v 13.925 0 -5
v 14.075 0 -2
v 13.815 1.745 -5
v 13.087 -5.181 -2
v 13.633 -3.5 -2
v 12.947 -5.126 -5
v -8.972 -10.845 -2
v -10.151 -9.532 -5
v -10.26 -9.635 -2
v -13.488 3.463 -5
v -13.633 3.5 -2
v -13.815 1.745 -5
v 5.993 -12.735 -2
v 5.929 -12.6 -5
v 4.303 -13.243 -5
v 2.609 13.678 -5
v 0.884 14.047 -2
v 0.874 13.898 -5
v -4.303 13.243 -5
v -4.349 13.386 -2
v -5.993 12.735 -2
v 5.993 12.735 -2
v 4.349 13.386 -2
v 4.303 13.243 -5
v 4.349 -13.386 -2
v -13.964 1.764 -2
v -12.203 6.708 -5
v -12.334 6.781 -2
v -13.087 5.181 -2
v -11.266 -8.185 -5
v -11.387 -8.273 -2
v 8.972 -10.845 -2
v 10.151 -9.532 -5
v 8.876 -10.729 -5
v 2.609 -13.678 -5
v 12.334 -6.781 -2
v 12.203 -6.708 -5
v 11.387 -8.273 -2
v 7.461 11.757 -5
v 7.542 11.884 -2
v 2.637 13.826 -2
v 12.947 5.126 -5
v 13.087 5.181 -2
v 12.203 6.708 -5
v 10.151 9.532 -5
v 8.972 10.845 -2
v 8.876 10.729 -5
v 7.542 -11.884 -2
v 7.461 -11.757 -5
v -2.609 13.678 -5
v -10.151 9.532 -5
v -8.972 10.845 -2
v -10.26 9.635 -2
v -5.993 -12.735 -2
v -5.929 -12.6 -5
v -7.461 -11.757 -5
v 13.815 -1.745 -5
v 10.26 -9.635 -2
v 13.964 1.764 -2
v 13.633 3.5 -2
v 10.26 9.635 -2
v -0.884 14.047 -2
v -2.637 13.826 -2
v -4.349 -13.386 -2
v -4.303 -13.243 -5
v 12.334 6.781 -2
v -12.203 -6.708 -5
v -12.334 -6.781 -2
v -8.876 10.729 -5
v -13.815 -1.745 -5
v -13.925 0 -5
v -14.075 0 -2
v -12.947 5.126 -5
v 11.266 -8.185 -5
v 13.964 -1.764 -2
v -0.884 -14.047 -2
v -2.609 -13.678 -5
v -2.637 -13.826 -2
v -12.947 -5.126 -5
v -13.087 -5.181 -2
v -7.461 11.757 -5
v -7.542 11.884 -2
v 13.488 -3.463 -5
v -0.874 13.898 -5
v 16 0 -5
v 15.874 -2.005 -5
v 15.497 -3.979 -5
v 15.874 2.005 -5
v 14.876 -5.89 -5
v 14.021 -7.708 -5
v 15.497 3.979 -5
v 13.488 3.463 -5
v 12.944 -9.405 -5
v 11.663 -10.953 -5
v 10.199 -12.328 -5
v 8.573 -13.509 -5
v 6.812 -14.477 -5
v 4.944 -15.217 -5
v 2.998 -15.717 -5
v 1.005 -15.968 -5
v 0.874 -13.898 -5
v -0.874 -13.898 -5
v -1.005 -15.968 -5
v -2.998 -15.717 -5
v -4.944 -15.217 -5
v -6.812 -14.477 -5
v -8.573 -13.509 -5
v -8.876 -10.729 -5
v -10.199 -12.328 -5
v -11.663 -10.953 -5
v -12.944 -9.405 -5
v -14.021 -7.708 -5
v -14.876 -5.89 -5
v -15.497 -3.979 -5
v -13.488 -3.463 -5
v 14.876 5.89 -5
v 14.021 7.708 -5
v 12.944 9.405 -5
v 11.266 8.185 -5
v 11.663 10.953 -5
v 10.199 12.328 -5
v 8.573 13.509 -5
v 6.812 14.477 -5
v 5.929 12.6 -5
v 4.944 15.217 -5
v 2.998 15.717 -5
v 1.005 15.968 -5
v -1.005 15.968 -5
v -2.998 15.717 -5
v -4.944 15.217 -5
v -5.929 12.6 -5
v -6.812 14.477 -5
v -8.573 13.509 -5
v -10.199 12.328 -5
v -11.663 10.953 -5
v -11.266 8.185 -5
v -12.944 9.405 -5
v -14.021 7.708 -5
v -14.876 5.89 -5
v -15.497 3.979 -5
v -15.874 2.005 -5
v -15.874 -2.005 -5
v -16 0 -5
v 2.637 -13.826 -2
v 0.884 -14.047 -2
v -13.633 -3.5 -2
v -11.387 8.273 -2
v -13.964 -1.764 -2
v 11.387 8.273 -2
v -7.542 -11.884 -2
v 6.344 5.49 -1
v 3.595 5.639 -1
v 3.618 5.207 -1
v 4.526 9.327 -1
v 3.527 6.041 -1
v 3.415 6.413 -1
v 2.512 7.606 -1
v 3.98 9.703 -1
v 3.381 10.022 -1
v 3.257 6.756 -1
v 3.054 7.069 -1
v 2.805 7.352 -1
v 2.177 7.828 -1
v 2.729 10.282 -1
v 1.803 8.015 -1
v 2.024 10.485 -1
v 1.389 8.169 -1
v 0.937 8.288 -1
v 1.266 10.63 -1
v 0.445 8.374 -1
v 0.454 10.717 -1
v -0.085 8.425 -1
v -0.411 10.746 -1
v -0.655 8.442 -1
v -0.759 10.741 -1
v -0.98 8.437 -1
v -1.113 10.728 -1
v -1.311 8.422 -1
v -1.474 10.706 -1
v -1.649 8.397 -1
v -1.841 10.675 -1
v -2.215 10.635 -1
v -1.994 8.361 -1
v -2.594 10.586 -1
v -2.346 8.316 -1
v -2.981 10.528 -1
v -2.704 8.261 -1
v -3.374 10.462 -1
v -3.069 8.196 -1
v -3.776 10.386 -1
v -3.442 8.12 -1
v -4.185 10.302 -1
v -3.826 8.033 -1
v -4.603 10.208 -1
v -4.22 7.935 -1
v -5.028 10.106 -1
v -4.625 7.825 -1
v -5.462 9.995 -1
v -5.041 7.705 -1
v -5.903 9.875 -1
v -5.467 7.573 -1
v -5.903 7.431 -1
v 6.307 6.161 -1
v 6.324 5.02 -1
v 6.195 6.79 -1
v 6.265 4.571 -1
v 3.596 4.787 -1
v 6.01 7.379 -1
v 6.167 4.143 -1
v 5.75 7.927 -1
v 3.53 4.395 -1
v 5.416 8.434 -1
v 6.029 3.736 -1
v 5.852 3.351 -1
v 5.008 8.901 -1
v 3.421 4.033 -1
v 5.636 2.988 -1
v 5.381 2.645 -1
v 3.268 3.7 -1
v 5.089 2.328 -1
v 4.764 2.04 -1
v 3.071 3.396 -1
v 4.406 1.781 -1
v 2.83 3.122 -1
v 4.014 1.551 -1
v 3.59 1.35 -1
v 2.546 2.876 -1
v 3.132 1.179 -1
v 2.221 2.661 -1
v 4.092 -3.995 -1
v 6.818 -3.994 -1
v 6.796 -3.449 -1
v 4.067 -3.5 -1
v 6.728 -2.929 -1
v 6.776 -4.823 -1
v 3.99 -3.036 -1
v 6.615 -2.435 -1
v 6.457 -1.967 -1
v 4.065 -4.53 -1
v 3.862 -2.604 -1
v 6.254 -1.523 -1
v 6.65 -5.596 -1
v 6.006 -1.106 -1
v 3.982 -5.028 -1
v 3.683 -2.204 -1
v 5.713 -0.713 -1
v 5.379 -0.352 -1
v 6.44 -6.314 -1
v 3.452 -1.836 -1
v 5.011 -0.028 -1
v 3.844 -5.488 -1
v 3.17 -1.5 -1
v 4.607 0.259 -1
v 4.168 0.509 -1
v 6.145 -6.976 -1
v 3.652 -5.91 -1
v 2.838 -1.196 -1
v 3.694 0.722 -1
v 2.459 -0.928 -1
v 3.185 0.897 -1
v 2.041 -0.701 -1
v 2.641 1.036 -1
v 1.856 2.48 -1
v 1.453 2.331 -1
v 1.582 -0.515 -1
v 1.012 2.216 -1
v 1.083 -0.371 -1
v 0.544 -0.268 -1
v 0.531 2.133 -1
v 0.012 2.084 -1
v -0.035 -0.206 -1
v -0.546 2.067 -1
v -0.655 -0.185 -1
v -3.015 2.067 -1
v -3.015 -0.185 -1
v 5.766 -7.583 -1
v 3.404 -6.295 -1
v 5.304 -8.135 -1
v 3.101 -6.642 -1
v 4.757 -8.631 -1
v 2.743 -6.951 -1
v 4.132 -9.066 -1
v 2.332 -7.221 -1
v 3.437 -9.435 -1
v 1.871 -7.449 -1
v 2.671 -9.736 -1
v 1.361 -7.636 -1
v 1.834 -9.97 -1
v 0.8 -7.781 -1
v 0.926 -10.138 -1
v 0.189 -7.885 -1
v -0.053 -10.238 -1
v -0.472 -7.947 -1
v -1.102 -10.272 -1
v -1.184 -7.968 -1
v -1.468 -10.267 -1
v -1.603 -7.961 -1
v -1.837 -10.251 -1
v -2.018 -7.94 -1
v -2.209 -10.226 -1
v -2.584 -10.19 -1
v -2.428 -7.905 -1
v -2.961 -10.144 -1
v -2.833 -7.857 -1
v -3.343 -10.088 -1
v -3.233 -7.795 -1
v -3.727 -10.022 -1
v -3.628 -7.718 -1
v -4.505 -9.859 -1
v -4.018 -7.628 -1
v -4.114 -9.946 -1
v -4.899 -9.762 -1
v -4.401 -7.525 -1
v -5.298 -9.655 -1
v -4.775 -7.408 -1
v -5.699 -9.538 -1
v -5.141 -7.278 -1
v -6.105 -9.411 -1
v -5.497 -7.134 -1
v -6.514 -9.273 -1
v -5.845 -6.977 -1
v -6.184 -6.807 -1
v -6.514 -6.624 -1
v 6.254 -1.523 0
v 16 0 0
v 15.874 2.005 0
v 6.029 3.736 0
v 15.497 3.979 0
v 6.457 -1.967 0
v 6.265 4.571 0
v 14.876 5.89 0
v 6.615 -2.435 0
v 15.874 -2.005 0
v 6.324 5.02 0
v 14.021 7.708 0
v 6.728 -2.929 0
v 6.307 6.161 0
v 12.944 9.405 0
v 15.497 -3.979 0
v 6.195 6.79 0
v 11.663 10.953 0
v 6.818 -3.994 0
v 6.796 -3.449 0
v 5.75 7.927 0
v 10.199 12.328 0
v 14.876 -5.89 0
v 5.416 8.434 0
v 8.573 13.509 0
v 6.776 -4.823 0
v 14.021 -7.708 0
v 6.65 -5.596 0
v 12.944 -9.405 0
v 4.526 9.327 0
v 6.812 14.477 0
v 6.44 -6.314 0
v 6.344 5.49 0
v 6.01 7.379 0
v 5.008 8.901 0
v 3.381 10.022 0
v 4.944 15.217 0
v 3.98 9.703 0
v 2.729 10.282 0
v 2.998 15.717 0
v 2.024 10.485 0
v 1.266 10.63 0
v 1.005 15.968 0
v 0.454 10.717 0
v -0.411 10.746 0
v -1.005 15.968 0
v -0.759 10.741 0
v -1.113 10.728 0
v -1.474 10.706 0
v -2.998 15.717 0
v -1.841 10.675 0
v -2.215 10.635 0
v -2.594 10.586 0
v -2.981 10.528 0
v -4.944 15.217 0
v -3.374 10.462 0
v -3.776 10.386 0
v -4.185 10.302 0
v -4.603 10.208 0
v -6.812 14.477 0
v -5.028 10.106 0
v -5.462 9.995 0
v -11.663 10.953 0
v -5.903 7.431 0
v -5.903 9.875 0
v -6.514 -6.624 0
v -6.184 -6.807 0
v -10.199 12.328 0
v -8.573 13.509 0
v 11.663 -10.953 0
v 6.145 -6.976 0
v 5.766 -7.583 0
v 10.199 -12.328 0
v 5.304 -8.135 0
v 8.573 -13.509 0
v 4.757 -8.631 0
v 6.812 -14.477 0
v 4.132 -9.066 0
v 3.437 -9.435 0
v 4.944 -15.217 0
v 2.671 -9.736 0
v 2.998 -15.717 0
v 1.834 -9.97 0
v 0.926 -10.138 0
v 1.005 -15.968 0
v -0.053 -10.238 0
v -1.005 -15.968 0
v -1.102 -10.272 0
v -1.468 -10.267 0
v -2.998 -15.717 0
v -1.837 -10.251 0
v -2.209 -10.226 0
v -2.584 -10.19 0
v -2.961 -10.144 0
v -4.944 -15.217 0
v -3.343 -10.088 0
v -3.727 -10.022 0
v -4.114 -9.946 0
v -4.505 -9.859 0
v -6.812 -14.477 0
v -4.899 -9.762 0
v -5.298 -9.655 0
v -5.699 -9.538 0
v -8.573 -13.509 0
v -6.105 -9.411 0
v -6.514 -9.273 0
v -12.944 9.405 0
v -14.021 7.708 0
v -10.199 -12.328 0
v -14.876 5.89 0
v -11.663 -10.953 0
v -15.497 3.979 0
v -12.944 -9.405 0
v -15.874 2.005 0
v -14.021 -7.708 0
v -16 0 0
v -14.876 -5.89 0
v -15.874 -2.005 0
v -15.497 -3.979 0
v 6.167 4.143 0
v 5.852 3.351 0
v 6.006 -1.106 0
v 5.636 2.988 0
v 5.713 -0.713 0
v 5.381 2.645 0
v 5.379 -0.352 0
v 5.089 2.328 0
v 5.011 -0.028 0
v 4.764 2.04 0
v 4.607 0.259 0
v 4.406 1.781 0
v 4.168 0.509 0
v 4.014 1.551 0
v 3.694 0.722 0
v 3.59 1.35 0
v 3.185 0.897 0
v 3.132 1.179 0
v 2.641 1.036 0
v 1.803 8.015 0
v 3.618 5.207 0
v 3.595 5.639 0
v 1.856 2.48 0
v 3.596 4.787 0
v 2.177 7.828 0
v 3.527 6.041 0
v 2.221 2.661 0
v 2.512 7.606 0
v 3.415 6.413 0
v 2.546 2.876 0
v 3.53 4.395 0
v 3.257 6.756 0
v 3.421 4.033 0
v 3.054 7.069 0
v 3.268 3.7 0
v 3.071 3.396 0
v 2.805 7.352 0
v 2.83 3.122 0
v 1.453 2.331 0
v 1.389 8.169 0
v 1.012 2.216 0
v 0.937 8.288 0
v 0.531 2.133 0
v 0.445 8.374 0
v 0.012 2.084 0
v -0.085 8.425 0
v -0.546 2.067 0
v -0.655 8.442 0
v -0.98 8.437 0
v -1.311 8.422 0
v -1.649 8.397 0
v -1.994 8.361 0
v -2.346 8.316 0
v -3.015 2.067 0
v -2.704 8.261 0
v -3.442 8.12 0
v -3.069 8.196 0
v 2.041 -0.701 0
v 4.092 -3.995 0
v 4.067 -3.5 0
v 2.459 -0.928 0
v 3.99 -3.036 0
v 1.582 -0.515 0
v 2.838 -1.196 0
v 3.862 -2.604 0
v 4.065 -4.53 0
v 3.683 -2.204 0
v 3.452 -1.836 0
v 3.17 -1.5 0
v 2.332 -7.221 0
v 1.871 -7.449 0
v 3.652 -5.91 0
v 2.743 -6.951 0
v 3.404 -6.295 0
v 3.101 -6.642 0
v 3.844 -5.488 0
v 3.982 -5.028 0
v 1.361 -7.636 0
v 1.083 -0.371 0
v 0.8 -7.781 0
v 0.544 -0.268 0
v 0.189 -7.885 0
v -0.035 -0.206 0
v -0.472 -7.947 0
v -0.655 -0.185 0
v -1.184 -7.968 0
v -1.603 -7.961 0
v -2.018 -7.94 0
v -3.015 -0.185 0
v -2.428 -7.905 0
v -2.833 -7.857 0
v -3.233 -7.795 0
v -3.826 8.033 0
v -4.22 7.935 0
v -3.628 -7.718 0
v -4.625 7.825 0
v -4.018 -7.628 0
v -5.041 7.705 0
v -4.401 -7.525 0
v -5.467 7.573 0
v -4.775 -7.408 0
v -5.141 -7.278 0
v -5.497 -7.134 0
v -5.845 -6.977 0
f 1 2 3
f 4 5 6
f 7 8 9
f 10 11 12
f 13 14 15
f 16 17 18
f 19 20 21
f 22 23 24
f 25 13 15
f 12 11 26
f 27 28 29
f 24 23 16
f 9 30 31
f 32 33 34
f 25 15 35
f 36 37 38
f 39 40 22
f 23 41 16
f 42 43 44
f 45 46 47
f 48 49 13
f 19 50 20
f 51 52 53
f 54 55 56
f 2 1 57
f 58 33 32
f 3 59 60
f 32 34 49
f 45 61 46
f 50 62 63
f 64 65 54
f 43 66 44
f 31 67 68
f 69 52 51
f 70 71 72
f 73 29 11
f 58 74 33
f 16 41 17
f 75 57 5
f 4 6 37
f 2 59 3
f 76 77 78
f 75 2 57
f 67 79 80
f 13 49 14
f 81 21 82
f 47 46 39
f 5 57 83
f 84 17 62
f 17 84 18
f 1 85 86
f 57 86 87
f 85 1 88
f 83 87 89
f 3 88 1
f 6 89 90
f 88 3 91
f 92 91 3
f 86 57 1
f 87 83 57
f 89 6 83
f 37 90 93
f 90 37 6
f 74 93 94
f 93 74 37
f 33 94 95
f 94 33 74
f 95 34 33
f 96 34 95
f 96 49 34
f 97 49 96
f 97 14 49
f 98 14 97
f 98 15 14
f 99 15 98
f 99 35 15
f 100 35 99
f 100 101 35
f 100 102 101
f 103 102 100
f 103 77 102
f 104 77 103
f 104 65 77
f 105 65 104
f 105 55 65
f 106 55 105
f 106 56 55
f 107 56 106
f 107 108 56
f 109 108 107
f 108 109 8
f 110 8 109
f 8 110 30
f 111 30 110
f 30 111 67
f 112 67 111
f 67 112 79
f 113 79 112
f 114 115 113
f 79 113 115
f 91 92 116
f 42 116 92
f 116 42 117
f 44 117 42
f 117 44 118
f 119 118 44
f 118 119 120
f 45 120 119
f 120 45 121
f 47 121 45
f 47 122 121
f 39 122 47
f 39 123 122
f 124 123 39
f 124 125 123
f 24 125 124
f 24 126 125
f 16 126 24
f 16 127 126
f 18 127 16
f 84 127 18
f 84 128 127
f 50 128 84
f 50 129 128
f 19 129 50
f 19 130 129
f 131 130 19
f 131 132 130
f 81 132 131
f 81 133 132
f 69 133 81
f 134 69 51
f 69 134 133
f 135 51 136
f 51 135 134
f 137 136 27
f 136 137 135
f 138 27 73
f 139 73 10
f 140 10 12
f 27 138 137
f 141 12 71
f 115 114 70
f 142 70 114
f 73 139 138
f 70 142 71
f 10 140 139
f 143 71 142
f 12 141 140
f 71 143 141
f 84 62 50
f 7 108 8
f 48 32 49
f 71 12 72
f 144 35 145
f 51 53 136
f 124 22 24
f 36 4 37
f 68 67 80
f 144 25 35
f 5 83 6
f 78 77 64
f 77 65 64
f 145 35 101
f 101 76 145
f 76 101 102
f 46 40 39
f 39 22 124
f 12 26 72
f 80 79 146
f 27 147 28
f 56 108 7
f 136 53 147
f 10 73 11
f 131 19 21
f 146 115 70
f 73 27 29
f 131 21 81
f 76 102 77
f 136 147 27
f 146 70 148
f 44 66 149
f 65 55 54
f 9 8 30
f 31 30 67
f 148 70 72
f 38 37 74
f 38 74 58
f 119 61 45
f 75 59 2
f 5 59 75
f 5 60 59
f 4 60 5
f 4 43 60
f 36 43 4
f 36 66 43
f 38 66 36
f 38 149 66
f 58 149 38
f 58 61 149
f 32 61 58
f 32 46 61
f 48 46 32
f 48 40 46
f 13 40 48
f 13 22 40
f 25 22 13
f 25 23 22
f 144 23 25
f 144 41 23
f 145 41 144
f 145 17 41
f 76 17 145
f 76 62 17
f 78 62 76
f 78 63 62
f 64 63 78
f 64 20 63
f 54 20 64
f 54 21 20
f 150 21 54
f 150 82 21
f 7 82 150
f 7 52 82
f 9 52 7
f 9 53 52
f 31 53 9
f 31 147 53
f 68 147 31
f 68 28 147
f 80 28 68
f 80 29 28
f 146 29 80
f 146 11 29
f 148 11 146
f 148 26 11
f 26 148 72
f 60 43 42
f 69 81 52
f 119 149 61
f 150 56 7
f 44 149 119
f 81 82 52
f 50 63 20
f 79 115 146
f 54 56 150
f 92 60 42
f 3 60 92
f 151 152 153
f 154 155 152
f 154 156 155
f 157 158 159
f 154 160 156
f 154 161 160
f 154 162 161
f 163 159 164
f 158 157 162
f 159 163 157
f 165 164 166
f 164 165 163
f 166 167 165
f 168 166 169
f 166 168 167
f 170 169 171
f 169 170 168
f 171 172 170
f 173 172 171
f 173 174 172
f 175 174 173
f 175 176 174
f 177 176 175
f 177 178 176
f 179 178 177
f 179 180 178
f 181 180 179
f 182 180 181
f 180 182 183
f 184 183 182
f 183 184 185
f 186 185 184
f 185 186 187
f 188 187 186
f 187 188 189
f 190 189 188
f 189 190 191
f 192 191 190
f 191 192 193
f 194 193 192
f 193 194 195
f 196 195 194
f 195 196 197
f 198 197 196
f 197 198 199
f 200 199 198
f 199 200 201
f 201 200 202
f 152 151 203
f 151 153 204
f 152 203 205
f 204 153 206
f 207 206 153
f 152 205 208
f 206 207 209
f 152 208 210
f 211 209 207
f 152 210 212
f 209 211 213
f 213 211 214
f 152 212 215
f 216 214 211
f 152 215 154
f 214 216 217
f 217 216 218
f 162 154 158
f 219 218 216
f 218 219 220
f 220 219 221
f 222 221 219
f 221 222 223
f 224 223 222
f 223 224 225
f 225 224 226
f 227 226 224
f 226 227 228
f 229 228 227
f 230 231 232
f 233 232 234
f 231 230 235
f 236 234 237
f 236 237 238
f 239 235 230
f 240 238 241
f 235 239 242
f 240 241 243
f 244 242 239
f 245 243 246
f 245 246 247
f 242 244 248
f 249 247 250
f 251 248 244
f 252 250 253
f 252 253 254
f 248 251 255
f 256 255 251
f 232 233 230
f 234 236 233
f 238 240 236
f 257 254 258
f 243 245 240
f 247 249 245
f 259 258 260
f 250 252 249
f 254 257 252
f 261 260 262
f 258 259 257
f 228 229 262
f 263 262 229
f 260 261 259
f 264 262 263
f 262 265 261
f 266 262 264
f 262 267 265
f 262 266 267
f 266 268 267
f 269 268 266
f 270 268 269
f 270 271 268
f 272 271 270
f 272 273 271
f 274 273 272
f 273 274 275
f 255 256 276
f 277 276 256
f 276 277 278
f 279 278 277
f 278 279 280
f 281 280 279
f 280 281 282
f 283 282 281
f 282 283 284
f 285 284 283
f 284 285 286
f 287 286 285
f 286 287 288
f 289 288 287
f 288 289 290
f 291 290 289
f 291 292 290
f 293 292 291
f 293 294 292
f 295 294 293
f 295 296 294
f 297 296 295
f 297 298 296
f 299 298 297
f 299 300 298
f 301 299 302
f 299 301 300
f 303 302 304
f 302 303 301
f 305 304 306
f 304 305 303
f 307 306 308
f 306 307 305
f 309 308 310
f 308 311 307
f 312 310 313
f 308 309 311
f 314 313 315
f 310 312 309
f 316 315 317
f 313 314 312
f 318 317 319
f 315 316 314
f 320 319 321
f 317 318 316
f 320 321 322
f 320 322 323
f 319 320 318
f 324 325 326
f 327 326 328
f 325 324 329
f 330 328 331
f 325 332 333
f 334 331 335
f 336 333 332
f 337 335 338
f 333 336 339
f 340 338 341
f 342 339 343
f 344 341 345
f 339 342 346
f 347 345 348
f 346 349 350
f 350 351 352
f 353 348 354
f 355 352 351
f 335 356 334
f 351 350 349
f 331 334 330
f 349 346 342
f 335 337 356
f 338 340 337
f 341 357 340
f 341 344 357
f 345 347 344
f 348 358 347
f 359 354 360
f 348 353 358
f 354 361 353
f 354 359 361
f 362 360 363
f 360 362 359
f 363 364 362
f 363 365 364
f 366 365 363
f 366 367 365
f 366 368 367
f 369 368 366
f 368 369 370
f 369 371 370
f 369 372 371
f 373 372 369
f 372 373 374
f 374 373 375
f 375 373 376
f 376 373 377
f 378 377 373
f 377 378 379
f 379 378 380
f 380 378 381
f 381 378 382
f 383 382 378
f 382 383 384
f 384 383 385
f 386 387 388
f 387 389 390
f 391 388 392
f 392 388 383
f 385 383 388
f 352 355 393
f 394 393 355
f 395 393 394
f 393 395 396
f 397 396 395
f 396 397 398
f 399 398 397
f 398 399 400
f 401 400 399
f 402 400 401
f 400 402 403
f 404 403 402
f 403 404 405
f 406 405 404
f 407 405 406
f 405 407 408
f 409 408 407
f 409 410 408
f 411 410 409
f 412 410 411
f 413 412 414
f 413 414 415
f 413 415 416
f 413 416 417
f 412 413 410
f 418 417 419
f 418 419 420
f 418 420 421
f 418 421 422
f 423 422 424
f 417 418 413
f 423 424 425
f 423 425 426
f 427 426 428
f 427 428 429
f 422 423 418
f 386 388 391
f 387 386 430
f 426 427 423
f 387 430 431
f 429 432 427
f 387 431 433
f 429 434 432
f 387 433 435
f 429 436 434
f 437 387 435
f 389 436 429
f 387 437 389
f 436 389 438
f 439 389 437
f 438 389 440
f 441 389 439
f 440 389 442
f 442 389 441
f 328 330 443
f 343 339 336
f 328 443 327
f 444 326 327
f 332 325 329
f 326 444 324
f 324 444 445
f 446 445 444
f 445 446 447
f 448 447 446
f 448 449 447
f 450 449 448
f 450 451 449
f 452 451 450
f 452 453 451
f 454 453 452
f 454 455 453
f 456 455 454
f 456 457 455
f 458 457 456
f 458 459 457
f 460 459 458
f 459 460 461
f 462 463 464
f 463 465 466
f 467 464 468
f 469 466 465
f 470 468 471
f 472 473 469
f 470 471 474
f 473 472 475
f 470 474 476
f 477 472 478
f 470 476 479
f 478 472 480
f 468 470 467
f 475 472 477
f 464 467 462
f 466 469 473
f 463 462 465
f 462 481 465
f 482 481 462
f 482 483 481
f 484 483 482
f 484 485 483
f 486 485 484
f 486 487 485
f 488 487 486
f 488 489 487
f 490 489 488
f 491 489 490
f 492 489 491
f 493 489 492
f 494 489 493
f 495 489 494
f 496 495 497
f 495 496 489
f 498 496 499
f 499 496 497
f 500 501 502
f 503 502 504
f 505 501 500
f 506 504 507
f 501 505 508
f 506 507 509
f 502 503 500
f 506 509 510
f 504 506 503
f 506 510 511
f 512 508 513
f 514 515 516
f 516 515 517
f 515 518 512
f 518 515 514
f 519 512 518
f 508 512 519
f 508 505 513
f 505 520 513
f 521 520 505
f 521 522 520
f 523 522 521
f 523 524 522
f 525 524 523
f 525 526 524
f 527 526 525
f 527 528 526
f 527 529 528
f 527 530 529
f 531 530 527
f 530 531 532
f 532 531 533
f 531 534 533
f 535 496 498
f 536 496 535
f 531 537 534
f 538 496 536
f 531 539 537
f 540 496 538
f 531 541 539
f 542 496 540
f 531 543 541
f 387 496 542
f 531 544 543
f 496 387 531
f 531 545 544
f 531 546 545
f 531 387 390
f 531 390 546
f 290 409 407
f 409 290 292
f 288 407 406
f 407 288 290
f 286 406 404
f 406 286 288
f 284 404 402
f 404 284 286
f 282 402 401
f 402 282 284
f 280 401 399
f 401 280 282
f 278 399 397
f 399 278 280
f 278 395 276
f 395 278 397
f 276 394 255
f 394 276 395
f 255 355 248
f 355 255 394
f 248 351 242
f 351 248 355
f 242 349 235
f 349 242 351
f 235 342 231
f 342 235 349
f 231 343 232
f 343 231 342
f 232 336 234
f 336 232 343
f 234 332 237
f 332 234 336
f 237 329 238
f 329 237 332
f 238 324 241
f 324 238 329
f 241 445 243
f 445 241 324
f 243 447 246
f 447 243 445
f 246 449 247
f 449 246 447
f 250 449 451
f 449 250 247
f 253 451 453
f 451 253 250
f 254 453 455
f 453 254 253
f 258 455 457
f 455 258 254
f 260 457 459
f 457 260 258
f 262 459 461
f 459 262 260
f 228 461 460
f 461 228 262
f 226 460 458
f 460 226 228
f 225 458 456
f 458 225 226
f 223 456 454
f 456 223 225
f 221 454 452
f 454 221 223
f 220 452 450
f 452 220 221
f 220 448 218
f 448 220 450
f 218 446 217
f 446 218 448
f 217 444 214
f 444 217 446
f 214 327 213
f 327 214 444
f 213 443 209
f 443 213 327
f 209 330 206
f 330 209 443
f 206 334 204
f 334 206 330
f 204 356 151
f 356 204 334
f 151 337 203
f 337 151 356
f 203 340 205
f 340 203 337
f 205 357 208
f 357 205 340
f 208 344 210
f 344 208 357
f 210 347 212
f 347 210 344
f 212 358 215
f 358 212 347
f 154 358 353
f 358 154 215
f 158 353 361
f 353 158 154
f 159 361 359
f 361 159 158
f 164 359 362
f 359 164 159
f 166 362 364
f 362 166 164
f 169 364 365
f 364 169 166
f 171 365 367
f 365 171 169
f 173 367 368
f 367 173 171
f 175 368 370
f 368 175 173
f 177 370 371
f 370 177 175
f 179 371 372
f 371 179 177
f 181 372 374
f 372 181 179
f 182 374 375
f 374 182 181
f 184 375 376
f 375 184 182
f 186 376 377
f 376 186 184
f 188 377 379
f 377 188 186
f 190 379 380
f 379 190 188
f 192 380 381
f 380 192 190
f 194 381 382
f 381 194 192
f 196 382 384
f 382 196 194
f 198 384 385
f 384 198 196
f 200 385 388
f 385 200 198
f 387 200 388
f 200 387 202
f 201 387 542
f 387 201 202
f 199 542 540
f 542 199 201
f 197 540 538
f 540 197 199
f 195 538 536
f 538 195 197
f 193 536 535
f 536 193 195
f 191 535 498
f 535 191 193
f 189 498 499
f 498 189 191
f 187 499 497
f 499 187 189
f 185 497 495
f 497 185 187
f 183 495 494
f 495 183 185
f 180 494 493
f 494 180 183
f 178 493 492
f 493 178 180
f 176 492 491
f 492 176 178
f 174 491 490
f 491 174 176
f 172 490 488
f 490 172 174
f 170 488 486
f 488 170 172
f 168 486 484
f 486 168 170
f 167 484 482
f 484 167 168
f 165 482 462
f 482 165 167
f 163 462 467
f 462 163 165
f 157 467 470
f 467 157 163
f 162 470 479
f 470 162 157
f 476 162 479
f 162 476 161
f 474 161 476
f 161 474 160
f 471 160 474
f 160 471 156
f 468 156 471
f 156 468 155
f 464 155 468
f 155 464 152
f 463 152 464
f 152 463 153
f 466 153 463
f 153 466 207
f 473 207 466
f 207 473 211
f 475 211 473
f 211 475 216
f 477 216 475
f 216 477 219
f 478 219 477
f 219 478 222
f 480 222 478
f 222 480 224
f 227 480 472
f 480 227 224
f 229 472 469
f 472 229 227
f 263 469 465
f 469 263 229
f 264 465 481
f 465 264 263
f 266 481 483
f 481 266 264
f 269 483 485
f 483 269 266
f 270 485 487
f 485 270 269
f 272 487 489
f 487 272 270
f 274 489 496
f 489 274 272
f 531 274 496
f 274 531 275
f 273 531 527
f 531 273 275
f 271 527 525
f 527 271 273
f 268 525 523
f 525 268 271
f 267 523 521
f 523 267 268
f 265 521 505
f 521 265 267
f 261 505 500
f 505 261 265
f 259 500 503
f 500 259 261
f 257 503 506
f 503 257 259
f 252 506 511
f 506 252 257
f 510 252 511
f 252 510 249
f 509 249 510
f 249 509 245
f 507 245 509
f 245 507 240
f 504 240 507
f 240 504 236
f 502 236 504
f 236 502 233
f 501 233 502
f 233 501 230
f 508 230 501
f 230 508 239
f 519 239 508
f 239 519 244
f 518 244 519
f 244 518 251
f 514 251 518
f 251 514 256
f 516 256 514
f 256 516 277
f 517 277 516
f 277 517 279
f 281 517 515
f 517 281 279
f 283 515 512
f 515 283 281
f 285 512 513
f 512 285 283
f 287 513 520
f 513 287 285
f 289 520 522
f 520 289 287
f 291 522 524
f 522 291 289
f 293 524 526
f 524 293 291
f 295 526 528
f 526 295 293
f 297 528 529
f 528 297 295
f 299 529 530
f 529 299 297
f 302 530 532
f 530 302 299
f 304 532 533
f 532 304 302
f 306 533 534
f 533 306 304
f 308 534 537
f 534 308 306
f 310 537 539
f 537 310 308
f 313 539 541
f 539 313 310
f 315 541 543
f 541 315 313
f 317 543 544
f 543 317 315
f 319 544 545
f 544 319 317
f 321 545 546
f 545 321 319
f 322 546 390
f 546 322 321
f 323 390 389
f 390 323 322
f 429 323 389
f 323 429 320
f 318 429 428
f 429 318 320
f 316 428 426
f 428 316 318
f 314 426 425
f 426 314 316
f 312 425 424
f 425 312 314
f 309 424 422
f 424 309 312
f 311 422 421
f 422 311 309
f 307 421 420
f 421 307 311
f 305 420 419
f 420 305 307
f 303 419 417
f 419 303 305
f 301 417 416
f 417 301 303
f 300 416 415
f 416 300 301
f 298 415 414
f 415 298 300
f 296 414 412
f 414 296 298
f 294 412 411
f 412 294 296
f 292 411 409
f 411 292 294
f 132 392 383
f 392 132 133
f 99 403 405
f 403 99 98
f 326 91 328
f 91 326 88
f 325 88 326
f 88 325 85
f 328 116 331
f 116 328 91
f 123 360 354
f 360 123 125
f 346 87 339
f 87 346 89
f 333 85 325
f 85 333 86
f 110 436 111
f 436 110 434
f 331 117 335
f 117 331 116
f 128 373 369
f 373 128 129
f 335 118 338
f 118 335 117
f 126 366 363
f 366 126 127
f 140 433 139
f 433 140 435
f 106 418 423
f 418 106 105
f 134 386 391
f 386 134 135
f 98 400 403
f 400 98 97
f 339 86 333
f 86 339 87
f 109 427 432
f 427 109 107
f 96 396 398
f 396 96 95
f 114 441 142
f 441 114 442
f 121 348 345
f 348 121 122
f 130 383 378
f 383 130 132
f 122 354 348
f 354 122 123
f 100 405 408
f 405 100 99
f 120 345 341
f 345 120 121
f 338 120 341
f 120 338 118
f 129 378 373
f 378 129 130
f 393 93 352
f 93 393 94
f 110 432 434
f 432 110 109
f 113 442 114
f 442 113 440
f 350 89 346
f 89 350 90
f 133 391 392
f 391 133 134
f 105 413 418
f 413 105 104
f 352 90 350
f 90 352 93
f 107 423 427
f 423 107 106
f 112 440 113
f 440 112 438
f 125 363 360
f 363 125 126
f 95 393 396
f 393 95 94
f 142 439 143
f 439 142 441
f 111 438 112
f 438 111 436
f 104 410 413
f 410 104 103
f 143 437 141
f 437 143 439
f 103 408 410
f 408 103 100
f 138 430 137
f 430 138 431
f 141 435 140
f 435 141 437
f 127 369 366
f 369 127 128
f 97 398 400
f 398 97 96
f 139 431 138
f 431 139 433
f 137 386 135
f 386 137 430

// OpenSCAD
$fn = 50;


difference() {
	union() {
		translate(v = [0, 0, -5.0000000000]) {
			cylinder(h = 5, r = 16.0000000000);
		}
	}
	union() {
		#translate(v = [0, 0, -5.0000000000]) {
			cylinder(h = 3, r1 = 13.9250000000, r2 = 14.0750000000);
		}
		translate(v = [0, 0, -1]) {
			linear_extrude(height = 1) {
				text(font = "Impact", halign = "center", size = 20, text = "3", valign = "center");
			}
		}
	}
}
